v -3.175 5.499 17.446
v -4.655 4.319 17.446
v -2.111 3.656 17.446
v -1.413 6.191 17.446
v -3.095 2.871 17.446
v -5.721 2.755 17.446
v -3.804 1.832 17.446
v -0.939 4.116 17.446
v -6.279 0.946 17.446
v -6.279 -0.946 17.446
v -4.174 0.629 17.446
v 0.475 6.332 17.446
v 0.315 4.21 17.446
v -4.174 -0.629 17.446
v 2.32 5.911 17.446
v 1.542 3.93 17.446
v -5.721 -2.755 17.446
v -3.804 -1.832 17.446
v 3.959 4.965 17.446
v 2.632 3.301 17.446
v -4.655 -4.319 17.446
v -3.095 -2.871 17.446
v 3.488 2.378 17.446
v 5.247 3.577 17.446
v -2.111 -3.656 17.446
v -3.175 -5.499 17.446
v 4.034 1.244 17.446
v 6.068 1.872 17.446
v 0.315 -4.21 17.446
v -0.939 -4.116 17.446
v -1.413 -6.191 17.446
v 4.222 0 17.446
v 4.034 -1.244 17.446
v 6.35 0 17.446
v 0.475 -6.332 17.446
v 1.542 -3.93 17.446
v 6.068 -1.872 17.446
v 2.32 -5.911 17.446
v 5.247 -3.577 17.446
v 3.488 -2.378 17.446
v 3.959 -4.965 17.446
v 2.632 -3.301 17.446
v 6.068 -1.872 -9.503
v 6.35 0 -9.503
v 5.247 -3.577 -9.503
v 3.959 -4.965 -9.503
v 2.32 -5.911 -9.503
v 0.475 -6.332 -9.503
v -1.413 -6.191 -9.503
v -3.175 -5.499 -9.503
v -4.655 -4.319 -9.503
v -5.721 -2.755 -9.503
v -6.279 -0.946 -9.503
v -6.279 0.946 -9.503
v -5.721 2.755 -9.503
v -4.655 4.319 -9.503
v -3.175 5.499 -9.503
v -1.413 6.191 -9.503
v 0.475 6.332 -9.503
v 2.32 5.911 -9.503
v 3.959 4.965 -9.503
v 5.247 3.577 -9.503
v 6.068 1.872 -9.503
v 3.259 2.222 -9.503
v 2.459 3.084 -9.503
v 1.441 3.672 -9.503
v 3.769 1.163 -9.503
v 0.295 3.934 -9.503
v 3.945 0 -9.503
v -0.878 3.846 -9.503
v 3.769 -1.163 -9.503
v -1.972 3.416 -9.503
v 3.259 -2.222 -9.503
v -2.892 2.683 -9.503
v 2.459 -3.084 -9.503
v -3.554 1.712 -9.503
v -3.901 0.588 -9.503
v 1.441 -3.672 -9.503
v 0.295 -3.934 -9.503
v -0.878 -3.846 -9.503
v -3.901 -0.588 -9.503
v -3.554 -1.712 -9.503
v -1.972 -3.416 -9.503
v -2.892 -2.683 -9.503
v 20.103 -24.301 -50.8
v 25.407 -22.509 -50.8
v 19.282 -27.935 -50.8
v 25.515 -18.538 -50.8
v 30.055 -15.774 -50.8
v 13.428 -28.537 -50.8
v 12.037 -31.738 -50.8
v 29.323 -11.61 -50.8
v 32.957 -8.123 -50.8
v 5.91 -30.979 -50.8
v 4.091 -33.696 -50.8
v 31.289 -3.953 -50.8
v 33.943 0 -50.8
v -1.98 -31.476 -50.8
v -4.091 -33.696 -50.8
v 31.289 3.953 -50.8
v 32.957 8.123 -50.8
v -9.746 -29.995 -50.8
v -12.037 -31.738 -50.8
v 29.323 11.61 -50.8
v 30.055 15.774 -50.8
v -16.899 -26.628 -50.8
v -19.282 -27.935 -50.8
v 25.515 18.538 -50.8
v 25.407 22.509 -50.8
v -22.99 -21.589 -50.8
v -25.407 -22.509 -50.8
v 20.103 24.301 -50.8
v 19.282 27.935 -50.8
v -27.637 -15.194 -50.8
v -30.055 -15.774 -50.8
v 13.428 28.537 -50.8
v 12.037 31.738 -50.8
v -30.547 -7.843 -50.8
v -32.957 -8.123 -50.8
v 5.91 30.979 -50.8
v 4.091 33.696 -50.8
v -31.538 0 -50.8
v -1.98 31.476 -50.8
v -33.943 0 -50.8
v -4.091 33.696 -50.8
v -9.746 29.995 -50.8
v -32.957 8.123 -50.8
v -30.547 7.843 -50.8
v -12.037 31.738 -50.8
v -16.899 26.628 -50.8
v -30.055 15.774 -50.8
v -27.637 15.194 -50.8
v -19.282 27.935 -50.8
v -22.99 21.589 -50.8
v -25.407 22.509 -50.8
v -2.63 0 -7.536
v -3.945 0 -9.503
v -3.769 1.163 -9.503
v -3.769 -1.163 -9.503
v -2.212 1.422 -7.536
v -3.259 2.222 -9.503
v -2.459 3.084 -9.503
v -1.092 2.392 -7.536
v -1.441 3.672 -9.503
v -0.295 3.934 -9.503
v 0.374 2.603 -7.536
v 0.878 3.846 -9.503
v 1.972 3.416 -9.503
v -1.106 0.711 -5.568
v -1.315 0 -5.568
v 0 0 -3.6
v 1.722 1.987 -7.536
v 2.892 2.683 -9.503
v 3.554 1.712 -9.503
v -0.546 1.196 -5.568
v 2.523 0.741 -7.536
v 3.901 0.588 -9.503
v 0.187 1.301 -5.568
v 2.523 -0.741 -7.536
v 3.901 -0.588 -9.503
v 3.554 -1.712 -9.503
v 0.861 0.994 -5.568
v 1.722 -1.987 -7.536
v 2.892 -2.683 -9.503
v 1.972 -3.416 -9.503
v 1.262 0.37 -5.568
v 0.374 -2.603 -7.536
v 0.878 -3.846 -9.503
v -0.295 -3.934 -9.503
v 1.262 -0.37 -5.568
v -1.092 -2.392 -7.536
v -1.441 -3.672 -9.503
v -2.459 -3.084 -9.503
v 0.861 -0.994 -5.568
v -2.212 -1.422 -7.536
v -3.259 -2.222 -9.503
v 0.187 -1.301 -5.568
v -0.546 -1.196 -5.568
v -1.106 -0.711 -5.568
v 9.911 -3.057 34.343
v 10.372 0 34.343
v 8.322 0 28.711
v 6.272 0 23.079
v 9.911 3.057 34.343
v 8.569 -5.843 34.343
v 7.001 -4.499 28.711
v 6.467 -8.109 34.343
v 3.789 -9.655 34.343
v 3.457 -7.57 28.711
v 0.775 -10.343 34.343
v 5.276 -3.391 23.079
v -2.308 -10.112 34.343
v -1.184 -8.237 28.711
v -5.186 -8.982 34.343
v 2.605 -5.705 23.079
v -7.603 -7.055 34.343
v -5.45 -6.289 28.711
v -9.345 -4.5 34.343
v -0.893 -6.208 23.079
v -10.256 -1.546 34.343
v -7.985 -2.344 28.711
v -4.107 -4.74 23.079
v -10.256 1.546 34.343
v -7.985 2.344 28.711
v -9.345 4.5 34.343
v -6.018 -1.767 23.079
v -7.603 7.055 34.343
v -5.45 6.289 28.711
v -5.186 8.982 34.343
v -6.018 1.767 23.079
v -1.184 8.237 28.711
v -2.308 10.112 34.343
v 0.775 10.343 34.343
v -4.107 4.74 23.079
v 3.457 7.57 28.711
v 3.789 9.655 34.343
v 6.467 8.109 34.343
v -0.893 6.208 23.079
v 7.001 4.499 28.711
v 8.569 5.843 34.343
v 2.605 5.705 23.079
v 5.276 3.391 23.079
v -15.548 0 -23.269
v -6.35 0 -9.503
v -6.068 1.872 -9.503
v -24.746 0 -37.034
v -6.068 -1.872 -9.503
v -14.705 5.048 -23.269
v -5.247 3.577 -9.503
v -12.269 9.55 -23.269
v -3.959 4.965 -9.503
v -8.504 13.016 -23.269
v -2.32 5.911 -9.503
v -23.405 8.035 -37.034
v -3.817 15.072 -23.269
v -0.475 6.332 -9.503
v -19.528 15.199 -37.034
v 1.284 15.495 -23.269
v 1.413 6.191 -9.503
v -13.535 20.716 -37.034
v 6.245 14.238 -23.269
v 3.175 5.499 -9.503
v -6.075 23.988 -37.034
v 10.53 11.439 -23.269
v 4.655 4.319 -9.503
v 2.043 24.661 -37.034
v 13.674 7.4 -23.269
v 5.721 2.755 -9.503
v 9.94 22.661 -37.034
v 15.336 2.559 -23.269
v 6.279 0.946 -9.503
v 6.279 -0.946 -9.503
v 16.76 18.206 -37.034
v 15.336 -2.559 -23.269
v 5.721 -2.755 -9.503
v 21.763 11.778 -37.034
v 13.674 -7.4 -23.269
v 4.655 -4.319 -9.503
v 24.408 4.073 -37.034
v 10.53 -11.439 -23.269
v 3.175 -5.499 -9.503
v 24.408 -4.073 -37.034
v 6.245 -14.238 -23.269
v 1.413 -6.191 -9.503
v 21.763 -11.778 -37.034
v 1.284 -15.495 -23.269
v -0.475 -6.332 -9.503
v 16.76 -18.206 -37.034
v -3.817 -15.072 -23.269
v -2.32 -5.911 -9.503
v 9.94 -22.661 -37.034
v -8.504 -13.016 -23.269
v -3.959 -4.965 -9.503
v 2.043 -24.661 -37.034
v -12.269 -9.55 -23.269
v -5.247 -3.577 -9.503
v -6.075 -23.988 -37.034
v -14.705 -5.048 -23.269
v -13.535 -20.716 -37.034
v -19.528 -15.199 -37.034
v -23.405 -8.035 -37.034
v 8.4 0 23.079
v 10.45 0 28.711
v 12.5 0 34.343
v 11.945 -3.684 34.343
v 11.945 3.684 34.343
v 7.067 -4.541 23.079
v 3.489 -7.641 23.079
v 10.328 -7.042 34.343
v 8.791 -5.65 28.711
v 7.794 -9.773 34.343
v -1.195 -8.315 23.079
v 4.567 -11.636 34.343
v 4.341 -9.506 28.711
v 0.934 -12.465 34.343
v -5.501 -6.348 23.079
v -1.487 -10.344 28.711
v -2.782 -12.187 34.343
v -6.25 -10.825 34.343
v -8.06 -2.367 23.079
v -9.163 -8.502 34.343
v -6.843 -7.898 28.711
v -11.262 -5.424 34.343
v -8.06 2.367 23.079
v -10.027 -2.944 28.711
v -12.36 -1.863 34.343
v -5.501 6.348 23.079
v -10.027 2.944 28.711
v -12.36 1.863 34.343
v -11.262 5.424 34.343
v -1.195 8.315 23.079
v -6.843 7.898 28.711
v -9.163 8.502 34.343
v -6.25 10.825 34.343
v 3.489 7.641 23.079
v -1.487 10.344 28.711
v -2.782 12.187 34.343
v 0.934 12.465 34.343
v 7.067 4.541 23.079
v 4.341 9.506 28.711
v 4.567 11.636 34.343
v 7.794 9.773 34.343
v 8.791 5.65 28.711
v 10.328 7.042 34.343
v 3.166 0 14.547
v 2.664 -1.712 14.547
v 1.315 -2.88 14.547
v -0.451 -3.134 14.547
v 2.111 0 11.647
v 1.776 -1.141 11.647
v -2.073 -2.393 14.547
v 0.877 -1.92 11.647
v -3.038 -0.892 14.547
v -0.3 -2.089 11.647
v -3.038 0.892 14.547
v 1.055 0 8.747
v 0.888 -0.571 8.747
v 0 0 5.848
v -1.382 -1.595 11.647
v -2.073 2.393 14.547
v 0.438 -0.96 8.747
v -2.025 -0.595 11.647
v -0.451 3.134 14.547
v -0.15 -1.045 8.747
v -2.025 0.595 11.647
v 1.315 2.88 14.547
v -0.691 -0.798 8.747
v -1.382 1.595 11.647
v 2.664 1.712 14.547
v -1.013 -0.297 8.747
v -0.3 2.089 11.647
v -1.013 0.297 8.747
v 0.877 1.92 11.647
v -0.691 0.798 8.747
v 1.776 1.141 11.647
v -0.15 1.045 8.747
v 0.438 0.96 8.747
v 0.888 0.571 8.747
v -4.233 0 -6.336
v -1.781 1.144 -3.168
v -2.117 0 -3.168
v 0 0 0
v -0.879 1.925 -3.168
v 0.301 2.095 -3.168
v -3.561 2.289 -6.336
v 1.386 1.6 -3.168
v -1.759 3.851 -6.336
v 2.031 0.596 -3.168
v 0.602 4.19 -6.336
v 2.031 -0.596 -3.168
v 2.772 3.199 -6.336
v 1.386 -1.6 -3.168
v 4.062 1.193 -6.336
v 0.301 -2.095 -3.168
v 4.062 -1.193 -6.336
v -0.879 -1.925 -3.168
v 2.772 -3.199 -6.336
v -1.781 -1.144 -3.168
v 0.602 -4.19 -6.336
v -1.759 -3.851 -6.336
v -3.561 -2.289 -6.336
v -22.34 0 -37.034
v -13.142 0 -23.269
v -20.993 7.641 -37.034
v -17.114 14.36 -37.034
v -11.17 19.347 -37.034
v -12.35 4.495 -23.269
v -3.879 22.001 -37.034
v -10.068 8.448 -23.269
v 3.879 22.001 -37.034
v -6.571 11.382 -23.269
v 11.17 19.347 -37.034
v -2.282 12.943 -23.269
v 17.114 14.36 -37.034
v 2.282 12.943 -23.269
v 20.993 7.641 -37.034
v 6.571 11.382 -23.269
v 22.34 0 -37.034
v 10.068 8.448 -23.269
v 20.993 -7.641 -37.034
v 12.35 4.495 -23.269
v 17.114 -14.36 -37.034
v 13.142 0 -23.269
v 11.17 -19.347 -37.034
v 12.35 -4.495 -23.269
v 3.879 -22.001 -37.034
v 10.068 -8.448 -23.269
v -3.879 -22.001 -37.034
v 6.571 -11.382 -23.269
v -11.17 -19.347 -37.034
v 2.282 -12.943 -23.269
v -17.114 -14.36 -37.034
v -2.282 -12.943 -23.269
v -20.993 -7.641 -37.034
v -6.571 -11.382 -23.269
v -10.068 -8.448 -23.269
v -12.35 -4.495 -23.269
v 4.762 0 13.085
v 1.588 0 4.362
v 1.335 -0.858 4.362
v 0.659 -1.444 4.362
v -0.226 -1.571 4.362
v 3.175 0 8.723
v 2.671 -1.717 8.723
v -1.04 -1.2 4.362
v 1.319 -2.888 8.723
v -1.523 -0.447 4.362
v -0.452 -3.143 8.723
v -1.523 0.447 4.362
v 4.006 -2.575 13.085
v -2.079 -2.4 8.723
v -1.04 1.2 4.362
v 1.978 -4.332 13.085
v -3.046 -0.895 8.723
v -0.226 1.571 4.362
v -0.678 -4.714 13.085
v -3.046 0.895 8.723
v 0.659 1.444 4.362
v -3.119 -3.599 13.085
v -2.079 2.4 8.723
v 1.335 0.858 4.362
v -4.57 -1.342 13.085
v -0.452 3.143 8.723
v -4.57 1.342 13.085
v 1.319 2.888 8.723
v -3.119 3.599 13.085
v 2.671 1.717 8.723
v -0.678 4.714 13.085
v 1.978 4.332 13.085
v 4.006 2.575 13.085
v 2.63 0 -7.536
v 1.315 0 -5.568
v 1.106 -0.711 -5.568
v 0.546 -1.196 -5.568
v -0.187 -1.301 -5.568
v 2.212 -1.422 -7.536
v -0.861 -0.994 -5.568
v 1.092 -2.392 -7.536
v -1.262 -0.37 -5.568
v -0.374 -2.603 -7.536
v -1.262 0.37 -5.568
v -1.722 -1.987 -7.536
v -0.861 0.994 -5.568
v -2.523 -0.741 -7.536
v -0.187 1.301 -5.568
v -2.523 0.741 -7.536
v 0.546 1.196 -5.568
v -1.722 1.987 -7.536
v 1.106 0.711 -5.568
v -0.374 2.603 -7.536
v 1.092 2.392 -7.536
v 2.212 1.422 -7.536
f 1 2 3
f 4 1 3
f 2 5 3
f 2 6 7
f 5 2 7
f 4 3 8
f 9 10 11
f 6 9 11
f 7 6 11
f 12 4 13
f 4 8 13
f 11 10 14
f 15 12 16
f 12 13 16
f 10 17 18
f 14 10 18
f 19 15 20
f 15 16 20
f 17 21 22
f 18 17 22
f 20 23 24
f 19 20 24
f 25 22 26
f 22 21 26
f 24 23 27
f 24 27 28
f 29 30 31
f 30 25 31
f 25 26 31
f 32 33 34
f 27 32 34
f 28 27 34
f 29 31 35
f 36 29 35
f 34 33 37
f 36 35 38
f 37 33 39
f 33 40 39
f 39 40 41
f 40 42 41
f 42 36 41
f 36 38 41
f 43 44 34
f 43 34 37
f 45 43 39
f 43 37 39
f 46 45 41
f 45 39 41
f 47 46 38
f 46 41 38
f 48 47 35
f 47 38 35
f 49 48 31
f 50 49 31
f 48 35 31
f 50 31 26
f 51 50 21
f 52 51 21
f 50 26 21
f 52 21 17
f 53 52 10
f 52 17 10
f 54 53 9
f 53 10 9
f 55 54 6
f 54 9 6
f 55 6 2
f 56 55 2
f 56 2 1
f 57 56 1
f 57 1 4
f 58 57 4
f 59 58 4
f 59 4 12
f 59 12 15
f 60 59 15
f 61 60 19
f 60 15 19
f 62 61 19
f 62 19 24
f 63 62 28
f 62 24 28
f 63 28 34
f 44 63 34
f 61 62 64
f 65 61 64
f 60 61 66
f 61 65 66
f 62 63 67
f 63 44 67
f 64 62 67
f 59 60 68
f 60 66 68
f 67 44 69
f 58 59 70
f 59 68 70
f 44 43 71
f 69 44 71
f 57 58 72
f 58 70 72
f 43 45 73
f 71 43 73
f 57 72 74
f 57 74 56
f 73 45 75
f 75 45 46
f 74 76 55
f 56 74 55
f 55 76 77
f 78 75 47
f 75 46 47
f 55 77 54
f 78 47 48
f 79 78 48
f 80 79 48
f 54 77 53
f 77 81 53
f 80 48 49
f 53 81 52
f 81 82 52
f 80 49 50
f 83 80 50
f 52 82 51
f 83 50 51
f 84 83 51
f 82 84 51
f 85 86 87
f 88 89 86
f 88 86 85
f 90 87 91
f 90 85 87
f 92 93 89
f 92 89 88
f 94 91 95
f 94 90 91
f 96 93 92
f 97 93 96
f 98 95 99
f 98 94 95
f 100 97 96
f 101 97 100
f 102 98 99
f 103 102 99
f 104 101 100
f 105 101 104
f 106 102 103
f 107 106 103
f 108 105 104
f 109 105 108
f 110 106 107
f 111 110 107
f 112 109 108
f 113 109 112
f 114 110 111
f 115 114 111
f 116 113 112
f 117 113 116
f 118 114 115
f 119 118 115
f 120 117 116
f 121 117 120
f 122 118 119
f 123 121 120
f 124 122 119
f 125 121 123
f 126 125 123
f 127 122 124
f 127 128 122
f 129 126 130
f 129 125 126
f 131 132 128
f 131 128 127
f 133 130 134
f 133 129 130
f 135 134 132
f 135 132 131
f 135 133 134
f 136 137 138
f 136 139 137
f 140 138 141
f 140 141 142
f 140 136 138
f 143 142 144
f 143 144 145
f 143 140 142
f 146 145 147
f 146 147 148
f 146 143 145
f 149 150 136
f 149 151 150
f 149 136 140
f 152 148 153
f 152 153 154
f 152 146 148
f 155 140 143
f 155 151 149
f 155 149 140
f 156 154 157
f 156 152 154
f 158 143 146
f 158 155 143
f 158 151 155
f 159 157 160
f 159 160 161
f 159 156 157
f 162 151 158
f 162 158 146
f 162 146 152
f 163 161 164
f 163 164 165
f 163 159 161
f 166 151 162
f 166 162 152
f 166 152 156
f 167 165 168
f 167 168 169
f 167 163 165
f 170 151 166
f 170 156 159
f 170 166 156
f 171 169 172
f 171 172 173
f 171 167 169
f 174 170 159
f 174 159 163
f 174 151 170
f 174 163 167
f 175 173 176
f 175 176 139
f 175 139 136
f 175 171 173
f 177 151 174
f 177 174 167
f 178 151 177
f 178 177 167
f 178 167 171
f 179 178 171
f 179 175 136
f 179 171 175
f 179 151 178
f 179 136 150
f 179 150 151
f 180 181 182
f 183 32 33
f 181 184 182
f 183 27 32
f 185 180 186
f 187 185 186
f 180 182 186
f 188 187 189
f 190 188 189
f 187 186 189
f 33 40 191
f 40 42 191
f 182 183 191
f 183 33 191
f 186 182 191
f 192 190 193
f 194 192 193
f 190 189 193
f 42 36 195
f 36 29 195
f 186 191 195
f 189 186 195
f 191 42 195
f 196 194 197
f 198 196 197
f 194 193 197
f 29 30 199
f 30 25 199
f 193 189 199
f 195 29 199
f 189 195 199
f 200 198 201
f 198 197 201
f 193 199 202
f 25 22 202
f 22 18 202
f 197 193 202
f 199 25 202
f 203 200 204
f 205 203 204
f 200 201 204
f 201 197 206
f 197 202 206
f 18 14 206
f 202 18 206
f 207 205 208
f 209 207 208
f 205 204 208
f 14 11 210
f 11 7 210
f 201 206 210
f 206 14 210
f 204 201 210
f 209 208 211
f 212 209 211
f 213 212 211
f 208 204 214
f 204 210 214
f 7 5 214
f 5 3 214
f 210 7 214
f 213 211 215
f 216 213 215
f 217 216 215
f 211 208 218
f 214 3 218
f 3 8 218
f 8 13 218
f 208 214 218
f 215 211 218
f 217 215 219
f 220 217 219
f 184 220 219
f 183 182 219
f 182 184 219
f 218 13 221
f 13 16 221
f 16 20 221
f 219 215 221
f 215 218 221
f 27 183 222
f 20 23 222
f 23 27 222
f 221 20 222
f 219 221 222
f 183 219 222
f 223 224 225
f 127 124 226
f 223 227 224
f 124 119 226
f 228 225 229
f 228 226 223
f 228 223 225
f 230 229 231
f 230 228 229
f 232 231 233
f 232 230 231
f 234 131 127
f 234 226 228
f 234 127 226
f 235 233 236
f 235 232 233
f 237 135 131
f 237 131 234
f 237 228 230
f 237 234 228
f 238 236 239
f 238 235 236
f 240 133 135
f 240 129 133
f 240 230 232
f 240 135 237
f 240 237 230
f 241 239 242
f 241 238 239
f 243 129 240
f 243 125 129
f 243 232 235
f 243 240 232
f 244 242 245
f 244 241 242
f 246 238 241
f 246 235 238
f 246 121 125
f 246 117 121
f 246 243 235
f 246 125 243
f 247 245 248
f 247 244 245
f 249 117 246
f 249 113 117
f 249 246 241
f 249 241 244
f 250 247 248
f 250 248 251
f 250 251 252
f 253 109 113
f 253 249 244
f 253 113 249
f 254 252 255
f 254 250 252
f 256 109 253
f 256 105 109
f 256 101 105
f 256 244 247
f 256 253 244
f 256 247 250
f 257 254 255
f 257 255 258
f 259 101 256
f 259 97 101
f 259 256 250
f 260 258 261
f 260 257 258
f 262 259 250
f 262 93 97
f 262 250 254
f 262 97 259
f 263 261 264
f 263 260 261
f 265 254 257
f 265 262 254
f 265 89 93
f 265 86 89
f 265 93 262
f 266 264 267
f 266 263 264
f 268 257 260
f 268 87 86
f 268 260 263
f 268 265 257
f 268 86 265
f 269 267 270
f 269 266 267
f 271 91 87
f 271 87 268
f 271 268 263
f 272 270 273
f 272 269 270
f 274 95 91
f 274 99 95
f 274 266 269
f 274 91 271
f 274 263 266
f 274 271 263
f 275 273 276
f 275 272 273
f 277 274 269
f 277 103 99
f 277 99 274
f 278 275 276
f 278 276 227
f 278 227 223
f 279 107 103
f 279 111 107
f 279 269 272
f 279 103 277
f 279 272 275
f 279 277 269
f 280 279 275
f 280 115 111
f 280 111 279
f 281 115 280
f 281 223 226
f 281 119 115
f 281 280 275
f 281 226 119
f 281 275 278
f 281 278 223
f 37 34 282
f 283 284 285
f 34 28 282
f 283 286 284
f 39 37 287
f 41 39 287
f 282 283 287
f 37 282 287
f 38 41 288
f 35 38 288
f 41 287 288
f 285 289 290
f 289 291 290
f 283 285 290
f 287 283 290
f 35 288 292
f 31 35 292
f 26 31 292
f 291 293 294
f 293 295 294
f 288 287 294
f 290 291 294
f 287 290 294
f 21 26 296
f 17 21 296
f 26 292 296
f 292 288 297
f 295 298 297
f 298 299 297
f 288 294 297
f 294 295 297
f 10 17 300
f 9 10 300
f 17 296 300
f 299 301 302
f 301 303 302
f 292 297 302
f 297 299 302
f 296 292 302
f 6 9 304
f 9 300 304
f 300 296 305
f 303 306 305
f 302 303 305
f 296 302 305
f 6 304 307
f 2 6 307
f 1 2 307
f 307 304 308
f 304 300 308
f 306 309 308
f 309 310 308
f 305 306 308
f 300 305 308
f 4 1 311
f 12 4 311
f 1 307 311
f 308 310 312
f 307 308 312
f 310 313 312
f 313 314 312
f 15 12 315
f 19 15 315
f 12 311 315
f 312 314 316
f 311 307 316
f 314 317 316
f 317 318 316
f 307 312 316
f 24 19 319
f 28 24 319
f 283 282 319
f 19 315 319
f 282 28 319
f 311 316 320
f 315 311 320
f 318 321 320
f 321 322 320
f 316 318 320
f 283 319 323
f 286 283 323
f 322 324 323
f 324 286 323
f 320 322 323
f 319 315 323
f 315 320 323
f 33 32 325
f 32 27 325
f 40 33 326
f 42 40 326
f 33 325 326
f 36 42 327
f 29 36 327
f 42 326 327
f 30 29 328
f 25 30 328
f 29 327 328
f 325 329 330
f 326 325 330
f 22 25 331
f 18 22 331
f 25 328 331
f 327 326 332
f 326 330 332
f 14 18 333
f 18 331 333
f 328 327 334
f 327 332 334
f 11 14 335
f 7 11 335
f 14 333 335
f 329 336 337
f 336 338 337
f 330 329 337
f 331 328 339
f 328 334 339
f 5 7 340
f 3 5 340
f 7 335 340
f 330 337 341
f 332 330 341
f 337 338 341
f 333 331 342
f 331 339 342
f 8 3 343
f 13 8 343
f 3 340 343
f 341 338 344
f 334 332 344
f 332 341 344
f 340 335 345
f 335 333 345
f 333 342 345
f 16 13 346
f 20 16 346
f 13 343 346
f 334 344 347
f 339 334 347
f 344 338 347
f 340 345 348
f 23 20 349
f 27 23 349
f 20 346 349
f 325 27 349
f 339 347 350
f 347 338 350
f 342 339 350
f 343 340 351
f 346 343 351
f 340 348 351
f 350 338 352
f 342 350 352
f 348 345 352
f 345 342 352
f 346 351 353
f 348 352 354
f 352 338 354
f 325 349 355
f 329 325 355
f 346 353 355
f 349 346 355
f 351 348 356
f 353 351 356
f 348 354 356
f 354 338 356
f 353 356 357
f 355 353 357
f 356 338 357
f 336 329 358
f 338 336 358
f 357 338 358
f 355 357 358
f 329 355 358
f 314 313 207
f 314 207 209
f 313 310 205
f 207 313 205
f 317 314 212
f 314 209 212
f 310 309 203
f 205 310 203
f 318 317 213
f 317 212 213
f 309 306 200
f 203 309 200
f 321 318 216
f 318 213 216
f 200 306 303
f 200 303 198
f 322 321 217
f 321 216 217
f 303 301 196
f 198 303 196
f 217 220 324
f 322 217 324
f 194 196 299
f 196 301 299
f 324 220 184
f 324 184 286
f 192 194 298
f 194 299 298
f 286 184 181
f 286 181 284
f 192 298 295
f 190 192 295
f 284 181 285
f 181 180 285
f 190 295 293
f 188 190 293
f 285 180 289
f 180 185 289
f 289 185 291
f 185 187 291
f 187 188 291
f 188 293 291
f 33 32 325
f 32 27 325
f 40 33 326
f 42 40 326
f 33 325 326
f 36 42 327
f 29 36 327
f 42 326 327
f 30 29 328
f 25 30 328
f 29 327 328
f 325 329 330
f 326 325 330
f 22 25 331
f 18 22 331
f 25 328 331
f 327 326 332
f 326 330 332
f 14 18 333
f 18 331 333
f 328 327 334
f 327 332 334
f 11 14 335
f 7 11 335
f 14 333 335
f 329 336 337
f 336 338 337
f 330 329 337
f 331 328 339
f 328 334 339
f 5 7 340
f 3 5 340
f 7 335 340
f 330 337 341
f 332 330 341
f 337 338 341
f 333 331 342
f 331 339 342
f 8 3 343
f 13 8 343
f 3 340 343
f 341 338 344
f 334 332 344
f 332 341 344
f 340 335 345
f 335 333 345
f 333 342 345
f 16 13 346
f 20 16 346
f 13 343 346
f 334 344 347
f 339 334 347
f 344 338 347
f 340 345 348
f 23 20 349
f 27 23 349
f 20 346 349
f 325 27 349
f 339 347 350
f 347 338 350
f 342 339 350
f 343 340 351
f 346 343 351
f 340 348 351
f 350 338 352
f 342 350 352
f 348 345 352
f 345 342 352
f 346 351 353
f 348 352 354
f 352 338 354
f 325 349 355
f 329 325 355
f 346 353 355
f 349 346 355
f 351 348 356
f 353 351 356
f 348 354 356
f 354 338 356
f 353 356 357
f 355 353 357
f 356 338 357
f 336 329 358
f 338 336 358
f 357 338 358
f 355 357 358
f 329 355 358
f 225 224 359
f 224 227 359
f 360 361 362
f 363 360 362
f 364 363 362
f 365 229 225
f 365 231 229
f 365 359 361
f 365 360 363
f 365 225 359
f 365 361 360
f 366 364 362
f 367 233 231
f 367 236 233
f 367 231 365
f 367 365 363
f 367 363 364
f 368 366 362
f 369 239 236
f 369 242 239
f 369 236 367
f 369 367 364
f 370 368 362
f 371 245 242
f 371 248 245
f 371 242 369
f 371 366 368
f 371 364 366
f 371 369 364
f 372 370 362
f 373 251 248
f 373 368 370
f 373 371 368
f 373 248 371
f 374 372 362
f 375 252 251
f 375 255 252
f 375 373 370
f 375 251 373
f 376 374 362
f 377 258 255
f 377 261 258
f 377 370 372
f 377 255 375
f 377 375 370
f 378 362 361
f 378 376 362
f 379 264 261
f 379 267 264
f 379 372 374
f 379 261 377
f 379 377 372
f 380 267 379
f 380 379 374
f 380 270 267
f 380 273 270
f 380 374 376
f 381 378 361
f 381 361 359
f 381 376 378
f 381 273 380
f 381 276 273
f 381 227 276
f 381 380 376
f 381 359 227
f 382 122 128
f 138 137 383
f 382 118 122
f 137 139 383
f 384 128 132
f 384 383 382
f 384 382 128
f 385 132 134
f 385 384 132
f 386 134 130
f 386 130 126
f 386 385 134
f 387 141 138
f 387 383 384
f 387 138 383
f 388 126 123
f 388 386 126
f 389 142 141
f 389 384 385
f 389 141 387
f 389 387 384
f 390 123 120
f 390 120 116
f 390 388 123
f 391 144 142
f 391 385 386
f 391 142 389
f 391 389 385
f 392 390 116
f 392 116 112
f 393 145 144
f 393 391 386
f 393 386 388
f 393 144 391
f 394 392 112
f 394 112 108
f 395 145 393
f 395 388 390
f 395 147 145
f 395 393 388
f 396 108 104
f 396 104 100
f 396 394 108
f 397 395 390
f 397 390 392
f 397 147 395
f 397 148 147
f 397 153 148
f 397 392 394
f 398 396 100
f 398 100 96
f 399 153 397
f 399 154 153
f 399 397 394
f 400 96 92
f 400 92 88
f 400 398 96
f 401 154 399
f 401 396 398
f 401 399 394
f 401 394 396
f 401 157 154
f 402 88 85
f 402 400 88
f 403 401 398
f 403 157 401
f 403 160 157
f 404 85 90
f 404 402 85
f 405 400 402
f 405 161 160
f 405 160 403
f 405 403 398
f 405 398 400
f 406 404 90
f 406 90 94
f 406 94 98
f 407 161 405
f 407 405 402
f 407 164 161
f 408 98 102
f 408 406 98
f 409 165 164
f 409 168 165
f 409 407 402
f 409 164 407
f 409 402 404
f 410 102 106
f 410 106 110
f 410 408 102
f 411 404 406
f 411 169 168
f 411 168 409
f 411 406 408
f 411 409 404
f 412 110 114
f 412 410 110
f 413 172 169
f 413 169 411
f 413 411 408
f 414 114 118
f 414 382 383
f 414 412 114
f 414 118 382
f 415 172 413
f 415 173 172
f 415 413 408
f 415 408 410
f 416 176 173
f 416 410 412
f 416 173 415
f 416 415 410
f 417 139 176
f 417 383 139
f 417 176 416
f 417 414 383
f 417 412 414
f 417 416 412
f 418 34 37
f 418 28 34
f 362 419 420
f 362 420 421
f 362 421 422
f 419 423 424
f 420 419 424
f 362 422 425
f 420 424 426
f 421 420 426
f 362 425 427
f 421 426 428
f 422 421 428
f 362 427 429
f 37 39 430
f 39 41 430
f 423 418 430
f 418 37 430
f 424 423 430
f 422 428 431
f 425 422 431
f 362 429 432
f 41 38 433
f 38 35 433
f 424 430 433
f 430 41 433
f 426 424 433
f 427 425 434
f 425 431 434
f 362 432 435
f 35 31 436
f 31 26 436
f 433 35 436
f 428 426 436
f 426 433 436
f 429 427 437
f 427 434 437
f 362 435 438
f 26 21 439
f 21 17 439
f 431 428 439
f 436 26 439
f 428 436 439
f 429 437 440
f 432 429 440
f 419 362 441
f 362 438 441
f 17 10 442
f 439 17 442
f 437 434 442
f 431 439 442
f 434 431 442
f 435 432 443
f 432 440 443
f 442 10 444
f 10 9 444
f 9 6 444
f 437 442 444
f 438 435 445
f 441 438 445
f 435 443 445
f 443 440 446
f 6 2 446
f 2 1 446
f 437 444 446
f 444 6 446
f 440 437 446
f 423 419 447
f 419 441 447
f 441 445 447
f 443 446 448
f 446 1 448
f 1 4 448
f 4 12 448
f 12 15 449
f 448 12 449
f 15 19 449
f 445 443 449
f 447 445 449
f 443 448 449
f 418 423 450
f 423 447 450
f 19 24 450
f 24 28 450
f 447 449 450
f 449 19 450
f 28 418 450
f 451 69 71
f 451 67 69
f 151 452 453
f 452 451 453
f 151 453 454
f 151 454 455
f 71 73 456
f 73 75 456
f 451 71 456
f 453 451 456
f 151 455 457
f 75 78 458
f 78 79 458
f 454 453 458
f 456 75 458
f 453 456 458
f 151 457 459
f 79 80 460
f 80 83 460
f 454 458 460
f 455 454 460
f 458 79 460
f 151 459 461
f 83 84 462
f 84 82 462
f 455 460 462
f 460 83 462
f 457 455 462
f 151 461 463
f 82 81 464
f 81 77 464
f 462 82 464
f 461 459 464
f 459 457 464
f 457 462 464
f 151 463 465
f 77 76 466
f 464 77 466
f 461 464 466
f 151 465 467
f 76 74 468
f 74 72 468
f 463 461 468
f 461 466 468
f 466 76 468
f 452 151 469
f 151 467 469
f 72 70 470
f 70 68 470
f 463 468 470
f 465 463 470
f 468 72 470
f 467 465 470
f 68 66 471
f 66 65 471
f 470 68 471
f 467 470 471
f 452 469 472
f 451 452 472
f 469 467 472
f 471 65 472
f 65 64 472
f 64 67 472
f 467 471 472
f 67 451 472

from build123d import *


with BuildPart() as f1:
    # F0 (on Front) → F1 (revolve)
    with BuildSketch(Plane.XZ):
        Polygon((4.221644455, 17.4464816135), (6.35, 17.4464816135), (12.5, 34.3434677432), (10.371644455, 34.3434677432), align=None)
        Polygon((0, 5.8476088003), (0, 0), (6.35, 17.4464816135), (4.221644455, 17.4464816135), align=None)
    revolve(axis=Axis((0, 0, -8.2282661284), (0, 0, -1)))


with BuildPart() as f2:
    # F0 (on Front) → F2 (revolve)
    with BuildSketch(Plane.XZ):
        Polygon((-3.9446204523, -9.5034465929), (-6.35, -9.5034465929), (-33.9434748063, -50.8), (-31.5380952586, -50.8), align=None)
        Polygon((0, -3.5999048925), (0, 0), (-6.35, -9.5034465929), (-3.9446204523, -9.5034465929), align=None)
    revolve(axis=Axis((0, 0, -8.2282661284), (0, 0, -1)))


with BuildPart() as f3:
    # F0 (on Front) → F3 (revolve)
    with BuildSketch(Plane.XZ):
        Polygon((6.35, 17.4464816135), (0, 0), (6.35, -9.5034465929), align=None)
        Polygon((0, 5.8476088003), (0, 0), (6.35, 17.4464816135), (4.221644455, 17.4464816135), align=None)
        Polygon((6.35, -9.5034465929), (0, 0), (0, -3.5999048925), (3.9446204523, -9.5034465929), align=None)
    revolve(axis=Axis((0, 0, -8.2282661284), (0, 0, -1)))


solid = Compound([f1.part, f2.part, f3.part])
